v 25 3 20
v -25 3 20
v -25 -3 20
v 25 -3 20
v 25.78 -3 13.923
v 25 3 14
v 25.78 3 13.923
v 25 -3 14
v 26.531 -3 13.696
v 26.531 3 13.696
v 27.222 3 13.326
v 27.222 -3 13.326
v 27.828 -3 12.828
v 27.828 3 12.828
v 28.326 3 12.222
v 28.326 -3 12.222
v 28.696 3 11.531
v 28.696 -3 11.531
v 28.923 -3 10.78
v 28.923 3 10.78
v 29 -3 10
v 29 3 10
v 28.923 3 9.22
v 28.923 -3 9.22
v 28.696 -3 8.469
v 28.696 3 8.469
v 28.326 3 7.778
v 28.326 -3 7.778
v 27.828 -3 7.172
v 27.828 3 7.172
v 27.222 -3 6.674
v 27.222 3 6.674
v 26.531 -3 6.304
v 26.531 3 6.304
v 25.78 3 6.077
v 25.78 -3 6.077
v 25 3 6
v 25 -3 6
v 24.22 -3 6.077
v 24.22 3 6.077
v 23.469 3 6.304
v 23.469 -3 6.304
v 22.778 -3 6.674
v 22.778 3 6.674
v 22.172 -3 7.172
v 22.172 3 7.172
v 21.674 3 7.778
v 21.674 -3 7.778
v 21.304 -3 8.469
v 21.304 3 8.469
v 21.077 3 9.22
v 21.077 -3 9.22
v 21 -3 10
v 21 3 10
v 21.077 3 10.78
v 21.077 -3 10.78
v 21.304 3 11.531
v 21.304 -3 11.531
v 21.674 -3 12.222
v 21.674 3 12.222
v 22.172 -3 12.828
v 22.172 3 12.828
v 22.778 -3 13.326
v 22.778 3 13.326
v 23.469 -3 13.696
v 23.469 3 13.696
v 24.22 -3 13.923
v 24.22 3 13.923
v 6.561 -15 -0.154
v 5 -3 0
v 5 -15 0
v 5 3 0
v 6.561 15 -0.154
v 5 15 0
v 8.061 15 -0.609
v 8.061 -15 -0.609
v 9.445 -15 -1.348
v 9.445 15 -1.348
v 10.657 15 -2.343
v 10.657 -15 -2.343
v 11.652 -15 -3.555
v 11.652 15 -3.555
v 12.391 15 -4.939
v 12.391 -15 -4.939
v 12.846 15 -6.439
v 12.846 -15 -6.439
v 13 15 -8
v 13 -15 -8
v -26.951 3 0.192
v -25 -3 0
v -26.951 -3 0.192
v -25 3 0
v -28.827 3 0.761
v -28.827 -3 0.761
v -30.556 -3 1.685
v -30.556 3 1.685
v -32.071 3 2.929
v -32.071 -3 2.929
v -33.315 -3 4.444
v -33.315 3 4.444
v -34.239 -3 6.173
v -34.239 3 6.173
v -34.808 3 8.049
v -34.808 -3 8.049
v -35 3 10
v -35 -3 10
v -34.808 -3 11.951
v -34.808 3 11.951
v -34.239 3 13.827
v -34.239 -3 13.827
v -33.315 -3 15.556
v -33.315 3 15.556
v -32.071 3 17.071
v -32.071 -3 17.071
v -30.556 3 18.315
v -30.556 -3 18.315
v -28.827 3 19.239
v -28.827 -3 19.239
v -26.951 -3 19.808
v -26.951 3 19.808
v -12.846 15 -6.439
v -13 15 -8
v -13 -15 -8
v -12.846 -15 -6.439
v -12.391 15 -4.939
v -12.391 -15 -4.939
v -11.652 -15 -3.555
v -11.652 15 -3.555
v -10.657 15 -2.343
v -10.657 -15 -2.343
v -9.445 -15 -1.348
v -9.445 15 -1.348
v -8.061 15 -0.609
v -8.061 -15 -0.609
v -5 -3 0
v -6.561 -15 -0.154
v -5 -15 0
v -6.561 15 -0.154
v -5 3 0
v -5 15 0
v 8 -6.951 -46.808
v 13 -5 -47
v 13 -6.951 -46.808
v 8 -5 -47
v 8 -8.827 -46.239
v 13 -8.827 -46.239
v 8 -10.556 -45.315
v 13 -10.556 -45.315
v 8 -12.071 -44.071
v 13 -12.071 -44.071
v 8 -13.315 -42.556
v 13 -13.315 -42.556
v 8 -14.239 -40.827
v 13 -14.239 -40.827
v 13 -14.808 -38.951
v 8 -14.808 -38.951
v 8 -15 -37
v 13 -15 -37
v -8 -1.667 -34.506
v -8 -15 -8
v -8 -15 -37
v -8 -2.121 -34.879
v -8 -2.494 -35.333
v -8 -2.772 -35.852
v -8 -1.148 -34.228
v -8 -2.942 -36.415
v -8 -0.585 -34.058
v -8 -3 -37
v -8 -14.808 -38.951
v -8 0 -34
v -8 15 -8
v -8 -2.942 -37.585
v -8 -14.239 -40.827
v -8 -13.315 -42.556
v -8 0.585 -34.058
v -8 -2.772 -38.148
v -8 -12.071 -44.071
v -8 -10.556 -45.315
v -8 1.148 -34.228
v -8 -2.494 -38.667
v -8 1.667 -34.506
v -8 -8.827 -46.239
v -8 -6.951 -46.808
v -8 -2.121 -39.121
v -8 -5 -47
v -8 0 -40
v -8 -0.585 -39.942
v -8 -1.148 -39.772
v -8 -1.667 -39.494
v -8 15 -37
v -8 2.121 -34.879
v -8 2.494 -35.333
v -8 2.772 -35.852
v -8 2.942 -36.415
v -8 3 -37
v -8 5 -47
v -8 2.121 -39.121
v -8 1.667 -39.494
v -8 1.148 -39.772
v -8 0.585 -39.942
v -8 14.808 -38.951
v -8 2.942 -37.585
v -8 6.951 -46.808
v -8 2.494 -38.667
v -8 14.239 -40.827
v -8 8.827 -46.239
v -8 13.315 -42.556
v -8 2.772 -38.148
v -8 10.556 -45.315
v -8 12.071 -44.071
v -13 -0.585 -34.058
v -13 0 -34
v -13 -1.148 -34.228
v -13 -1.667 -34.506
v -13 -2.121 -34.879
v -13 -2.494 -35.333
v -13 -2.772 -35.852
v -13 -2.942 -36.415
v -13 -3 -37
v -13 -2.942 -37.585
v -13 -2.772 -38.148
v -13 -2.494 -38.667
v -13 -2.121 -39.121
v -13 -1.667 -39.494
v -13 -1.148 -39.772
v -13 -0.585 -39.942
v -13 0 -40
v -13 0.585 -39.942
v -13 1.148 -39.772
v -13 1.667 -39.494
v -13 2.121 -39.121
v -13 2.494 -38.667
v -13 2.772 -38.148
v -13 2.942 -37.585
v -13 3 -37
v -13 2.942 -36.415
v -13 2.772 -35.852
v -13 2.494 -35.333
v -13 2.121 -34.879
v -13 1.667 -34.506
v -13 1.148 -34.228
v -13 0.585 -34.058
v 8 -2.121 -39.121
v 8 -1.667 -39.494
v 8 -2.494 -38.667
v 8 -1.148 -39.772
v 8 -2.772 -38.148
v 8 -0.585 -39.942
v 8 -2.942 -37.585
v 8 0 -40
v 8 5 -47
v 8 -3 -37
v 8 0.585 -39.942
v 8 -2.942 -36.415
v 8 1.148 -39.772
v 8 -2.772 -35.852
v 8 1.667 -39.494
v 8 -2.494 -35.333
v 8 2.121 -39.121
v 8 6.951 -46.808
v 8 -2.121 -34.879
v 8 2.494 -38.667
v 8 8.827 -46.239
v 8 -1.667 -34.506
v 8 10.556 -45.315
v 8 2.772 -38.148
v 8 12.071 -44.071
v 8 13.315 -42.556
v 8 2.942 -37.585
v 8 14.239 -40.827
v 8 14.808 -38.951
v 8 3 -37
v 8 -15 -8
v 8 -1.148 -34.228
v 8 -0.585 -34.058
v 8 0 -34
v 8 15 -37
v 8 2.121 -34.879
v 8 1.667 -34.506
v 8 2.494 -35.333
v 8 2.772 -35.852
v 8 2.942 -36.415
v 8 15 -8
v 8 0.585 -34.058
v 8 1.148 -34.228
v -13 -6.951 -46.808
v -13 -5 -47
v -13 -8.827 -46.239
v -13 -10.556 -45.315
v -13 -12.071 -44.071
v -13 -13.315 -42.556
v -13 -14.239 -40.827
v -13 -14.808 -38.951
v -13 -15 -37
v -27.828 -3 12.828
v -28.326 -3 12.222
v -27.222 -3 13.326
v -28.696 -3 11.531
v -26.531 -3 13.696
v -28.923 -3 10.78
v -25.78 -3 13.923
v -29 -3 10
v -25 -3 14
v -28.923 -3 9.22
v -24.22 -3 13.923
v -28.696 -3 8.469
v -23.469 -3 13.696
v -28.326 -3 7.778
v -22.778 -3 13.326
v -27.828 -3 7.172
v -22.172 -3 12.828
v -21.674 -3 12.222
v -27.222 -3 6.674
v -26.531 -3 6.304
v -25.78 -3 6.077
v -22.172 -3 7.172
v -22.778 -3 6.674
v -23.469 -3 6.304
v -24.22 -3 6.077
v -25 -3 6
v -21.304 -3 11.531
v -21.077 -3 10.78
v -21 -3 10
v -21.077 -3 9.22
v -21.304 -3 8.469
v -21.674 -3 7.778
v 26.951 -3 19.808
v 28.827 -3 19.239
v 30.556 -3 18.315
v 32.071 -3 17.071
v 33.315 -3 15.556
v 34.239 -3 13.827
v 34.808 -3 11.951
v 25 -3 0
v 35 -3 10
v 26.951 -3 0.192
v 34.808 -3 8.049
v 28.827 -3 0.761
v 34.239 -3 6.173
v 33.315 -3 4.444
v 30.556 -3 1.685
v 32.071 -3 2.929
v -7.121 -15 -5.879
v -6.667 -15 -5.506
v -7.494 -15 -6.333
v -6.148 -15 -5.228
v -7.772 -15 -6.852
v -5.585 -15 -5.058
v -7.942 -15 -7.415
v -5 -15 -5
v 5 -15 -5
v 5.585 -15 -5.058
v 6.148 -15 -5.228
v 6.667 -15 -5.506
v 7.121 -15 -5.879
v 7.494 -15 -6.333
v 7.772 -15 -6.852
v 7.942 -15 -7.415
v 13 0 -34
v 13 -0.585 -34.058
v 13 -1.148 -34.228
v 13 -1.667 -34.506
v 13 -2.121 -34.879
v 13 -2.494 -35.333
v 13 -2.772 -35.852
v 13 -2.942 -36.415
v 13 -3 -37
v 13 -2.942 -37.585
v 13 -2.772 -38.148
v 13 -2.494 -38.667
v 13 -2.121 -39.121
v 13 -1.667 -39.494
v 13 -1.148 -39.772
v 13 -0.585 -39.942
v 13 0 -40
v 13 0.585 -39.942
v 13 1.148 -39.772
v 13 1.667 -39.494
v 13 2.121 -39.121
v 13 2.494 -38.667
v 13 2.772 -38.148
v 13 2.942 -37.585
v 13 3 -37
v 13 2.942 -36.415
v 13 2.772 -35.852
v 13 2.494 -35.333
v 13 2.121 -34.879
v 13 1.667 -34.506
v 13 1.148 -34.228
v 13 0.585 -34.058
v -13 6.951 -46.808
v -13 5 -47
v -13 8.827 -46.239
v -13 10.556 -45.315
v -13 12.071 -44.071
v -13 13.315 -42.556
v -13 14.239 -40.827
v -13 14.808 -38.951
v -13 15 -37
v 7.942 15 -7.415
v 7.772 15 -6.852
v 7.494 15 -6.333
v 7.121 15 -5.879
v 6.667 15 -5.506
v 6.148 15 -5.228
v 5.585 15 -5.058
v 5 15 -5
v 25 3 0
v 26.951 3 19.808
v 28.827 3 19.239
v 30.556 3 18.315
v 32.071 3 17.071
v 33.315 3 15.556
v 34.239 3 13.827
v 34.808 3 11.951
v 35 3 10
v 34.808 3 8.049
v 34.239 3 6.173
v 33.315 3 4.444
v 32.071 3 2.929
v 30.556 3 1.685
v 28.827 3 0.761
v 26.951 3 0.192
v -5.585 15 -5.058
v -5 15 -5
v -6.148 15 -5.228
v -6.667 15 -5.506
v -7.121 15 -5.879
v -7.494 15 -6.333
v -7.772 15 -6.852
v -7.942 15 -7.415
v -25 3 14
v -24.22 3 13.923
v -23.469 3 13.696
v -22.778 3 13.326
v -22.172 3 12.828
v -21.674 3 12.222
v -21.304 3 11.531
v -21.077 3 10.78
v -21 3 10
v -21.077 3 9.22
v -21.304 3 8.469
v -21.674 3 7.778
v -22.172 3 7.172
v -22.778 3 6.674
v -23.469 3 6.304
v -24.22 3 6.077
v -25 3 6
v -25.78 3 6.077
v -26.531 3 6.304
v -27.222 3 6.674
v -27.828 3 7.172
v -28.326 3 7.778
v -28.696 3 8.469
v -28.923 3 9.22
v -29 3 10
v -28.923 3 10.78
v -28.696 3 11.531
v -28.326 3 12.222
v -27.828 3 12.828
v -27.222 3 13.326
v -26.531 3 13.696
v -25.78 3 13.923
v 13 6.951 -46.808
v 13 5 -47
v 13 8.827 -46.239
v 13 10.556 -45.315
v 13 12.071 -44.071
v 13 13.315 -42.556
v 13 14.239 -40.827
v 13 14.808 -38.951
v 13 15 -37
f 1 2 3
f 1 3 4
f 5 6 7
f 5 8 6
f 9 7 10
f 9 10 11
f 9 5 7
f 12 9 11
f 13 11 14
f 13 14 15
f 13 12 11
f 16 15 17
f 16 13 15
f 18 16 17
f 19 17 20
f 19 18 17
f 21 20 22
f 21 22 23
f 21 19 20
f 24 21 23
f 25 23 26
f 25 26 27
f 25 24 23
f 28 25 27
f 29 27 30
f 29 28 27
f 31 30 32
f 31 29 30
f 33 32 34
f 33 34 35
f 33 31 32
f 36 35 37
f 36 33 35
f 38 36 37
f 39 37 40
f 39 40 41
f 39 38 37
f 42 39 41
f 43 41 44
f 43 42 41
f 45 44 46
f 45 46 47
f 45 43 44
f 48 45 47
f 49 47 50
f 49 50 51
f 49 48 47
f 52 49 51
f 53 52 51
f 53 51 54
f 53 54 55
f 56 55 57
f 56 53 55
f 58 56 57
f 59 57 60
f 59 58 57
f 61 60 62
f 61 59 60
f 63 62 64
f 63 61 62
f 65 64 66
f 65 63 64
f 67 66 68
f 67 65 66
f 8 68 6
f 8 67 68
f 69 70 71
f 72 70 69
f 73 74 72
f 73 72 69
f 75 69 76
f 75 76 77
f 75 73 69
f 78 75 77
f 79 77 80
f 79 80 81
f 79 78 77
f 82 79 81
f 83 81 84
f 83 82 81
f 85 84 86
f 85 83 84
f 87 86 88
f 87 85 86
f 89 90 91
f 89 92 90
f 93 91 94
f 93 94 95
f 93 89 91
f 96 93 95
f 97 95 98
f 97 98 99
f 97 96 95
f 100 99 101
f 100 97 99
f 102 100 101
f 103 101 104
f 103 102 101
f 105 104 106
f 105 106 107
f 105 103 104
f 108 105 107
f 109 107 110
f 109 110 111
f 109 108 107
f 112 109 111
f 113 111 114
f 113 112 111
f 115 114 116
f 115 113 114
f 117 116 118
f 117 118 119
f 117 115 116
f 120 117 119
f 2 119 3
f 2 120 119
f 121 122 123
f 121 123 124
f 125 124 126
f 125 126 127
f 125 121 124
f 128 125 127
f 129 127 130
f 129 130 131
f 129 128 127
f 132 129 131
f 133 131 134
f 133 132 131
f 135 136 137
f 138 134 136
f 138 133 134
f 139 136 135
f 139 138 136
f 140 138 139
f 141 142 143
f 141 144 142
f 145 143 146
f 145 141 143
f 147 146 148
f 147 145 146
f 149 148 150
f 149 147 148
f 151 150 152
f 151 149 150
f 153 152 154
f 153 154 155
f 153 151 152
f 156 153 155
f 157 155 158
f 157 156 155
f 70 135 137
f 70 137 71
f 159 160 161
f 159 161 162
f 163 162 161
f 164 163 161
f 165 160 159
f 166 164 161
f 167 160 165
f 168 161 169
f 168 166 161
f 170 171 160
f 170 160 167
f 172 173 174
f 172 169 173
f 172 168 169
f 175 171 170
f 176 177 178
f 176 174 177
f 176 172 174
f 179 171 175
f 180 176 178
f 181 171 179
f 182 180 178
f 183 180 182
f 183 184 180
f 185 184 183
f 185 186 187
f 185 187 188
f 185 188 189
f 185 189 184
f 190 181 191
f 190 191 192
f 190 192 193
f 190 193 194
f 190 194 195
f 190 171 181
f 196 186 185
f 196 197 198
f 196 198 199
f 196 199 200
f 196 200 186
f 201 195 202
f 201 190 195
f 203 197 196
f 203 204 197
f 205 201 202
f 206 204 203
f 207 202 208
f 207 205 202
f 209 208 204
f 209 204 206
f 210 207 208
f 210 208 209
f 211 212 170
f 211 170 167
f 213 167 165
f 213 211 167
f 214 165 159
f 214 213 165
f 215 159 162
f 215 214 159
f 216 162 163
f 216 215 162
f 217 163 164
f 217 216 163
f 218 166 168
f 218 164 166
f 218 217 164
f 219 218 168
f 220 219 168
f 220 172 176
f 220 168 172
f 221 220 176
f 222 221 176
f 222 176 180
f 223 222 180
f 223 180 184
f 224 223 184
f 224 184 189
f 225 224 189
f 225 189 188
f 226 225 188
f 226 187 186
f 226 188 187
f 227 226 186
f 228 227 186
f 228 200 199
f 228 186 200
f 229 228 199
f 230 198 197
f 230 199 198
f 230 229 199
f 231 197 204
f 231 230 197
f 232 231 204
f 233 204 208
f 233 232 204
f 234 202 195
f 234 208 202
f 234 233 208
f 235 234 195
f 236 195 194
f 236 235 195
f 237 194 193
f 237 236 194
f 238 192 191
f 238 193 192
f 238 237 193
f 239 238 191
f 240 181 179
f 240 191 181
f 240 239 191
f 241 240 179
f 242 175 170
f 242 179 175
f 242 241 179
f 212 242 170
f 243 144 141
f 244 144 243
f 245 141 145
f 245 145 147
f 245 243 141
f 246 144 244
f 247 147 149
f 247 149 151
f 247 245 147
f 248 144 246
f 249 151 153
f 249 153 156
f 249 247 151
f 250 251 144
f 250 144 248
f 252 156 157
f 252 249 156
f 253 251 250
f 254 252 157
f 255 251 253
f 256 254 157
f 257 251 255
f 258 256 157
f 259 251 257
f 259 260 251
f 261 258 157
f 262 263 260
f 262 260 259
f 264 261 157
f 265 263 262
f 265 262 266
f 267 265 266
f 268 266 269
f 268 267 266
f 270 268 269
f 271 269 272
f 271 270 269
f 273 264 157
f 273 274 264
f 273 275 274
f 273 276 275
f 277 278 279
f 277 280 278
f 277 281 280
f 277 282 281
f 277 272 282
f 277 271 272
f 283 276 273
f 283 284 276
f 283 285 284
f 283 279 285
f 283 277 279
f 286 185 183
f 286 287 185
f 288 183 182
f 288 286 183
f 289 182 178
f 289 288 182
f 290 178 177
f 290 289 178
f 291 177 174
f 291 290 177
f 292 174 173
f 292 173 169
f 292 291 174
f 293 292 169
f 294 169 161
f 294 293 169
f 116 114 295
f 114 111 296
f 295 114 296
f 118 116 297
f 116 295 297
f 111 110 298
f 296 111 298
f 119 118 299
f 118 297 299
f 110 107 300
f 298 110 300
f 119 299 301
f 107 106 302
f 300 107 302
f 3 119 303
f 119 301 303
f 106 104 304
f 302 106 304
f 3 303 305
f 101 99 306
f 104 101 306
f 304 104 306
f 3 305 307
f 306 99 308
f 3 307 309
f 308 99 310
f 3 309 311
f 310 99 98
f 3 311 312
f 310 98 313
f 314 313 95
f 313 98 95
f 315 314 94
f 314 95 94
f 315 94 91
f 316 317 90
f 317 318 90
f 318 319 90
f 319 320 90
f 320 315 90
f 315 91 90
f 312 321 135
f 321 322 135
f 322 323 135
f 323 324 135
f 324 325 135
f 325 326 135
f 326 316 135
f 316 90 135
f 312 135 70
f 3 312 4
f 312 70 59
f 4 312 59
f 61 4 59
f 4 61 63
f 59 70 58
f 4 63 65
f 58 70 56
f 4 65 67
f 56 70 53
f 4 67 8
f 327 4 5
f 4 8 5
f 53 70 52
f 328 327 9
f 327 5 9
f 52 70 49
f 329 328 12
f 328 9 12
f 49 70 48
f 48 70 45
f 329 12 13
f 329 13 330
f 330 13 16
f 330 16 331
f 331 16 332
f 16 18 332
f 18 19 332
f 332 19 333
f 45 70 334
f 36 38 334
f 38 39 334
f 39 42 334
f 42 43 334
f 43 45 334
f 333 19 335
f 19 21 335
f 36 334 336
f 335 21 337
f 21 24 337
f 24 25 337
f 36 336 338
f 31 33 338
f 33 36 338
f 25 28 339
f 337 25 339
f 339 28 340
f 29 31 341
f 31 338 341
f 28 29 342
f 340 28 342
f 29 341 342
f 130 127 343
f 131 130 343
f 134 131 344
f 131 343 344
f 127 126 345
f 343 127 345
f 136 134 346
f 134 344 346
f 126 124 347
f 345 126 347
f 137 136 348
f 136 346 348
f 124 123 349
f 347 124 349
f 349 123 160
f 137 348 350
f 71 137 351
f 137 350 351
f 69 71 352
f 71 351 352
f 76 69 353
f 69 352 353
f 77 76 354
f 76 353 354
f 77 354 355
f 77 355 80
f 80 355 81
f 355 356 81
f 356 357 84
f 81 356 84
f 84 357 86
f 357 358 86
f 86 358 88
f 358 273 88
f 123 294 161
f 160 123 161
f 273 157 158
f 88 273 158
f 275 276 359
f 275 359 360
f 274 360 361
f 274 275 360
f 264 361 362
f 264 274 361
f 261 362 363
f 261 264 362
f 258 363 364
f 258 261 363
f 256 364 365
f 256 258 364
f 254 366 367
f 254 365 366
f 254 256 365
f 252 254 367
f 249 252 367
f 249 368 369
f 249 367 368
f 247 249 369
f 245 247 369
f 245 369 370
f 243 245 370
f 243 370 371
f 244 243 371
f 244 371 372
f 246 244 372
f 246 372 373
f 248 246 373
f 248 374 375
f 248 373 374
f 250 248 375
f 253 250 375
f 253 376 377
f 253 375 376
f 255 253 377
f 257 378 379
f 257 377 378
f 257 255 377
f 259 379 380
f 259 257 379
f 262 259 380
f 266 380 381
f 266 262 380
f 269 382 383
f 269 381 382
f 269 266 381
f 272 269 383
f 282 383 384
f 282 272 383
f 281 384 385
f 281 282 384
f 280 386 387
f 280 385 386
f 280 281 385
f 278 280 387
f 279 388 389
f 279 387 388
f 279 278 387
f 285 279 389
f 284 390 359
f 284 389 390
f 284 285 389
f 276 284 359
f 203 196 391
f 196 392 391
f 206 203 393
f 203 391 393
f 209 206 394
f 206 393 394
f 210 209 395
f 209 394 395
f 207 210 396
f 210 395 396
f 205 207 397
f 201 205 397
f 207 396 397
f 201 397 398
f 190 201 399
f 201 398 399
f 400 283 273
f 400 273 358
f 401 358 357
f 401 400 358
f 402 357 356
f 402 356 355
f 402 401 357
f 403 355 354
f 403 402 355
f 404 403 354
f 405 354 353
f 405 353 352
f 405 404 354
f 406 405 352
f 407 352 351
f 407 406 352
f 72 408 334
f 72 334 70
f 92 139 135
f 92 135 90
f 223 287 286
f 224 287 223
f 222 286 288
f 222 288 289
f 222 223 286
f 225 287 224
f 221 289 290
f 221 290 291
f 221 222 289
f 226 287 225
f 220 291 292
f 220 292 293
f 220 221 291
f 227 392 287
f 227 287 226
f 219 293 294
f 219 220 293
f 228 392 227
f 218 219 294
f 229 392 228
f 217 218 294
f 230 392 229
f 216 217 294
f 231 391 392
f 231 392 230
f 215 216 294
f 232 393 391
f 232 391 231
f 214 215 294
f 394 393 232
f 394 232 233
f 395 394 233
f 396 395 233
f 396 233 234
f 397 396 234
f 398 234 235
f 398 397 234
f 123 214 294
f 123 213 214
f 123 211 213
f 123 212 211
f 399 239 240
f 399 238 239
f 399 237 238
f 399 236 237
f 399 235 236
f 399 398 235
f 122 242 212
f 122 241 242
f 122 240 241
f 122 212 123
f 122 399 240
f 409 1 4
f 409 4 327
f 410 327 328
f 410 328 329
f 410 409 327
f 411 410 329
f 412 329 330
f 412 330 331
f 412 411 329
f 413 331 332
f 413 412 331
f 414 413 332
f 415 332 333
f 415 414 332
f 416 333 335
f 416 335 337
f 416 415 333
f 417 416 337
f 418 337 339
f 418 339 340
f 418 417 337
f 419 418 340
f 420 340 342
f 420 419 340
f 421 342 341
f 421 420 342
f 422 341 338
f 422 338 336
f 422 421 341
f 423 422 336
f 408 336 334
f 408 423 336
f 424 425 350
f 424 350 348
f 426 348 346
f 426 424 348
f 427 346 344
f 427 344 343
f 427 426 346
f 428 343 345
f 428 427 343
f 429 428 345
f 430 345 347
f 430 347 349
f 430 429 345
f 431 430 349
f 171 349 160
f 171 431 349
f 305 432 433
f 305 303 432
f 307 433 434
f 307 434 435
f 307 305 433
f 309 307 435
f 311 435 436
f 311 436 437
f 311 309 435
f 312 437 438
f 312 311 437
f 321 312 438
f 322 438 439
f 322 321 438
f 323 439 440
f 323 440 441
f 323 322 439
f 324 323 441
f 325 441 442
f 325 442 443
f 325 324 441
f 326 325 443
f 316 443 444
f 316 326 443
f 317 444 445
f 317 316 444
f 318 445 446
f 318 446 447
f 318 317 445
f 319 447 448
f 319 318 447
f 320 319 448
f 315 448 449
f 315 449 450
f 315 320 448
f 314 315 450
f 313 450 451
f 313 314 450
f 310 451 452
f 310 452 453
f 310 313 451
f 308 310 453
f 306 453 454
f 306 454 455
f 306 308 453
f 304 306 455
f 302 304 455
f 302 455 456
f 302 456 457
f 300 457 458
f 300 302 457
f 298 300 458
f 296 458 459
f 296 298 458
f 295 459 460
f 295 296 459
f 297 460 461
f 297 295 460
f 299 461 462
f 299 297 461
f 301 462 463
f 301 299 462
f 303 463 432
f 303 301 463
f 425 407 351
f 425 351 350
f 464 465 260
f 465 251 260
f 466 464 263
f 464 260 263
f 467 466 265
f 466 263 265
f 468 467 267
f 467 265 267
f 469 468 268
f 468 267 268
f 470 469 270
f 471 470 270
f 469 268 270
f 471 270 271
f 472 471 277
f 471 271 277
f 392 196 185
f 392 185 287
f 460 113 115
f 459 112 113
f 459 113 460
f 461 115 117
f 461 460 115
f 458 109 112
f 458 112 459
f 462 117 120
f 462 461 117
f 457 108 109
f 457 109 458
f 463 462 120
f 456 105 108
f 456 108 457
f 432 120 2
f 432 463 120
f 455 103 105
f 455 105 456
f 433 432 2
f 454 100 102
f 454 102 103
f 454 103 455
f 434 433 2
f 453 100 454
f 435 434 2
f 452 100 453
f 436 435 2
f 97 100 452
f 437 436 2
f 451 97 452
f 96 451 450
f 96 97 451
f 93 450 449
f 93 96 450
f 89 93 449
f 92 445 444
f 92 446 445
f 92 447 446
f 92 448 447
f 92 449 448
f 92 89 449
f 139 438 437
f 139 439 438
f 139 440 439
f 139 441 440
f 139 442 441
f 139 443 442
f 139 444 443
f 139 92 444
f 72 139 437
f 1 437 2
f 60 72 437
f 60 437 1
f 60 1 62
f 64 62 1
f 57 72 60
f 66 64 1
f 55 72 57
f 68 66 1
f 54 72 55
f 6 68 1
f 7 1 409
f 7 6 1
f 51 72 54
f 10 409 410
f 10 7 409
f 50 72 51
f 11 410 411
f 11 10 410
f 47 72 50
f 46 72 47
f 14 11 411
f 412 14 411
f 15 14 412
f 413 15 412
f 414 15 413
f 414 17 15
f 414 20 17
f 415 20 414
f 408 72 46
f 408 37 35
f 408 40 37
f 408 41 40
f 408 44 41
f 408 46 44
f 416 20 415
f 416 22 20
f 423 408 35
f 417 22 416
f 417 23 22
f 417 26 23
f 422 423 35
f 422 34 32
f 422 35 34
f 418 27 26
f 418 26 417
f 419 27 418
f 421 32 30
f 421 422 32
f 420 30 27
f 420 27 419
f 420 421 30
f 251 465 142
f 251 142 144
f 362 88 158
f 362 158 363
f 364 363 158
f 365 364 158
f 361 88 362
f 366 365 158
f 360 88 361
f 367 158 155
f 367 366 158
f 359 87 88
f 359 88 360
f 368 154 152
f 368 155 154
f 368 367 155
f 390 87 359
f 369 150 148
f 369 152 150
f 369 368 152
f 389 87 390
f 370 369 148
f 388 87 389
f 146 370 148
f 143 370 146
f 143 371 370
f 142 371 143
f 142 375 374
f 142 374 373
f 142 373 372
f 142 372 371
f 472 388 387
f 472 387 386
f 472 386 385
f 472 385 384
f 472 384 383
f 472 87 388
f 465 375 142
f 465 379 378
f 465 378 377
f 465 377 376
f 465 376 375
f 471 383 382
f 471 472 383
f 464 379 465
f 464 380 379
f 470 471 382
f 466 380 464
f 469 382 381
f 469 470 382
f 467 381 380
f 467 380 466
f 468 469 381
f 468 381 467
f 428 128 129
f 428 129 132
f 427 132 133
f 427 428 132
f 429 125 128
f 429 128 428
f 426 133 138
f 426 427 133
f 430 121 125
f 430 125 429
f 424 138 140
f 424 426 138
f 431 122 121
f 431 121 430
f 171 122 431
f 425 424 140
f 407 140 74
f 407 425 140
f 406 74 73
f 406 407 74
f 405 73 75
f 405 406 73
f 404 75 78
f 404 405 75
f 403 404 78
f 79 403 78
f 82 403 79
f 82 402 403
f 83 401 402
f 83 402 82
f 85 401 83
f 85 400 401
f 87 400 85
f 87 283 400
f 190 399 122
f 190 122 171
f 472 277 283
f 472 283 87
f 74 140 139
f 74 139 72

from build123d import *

# Parameters (mm, degrees)
EXTRUDE_THIN1_DEPTH     = 15
FILLET1_R               = 10
SKETCH2_R               = 4
BOSS_EXTRUDE1_DEPTH     = 3
CUT_EXTRUDE1_DEPTH      = 69.833131557
CUT_EXTRUDE1_DEPTH_BACK = 69.833131557


with BuildPart() as part:
    # Sketch1 → Extrude-Thin1 (new, symmetric)
    with BuildSketch(Plane(origin=(0, 0, 0), x_dir=(1, 0, 0), z_dir=(0, 1, 0))):
        with BuildLine():
            Line((-13, 47), (-13, 8))
            ThreePointArc((-13, 8), (-10.656854249, 2.343145751), (-5, 0))
            Line((-5, 0), (0, 0))
            Line((0, 0), (5, 0))
            ThreePointArc((5, 0), (10.656854249, 2.343145751), (13, 8))
            Line((13, 8), (13, 47))
            Line((13, 47), (8, 47))
            Line((8, 47), (8, 8))
            ThreePointArc((8, 8), (7.121320344, 5.878679656), (5, 5))
            Line((5, 5), (0, 5))
            Line((0, 5), (-5, 5))
            ThreePointArc((-5, 5), (-7.121320344, 5.878679656), (-8, 8))
            Line((-8, 8), (-8, 47))
            Line((-8, 47), (-13, 47))
        make_face()
    extrude(amount=EXTRUDE_THIN1_DEPTH, both=True)

    # Fillet1
    fillet1_edges = [part.edges().sort_by_distance(p)[0] for p in [
        (-10.5, -15, -47),
        (10.5, -15, -47),
        (-10.5, 15, -47),
        (10.5, 15, -47),
    ]]
    fillet(fillet1_edges, radius=FILLET1_R)

    # Sketch2 → Boss-Extrude1 (add, symmetric)
    with BuildSketch(Plane(origin=(0, 0, 0), x_dir=(1, 0, 0), z_dir=(0, 1, 0))):
        with BuildLine():
            Line((5, 0), (-5, 0))
            Line((-5, 0), (-25, 0))
            ThreePointArc((-25, 0), (-35, -10), (-25, -20))
            Line((-25, -20), (25, -20))
            ThreePointArc((25, -20), (35, -10), (25, 0))
            Line((25, 0), (5, 0))
        make_face()
        with Locations(Location((-25, -10, 0), (0, 0, 270))):
            Circle(SKETCH2_R, mode=Mode.SUBTRACT)
        with Locations(Location((25, -10, 0), (0, 0, 270))):
            Circle(SKETCH2_R, mode=Mode.SUBTRACT)
    extrude(amount=BOSS_EXTRUDE1_DEPTH, both=True)

    # Sketch3 → Cut-Extrude1 (cut, two sides: drawn at the far end of the back side and taken through both)
    with BuildSketch(Plane(origin=(13, 0, 0), x_dir=(0, 0, -1), z_dir=(1, 0, 0)).offset(-CUT_EXTRUDE1_DEPTH_BACK)):
        with BuildLine():
            ThreePointArc((40, 0), (37, 3), (34, 0))
            Line((34, 0), (40, 0))
        make_face()
        with BuildLine():
            Line((40, 0), (34, 0))
            ThreePointArc((34, 0), (37, -3), (40, 0))
        make_face()
    extrude(amount=CUT_EXTRUDE1_DEPTH + CUT_EXTRUDE1_DEPTH_BACK, mode=Mode.SUBTRACT)


solid = part.part
